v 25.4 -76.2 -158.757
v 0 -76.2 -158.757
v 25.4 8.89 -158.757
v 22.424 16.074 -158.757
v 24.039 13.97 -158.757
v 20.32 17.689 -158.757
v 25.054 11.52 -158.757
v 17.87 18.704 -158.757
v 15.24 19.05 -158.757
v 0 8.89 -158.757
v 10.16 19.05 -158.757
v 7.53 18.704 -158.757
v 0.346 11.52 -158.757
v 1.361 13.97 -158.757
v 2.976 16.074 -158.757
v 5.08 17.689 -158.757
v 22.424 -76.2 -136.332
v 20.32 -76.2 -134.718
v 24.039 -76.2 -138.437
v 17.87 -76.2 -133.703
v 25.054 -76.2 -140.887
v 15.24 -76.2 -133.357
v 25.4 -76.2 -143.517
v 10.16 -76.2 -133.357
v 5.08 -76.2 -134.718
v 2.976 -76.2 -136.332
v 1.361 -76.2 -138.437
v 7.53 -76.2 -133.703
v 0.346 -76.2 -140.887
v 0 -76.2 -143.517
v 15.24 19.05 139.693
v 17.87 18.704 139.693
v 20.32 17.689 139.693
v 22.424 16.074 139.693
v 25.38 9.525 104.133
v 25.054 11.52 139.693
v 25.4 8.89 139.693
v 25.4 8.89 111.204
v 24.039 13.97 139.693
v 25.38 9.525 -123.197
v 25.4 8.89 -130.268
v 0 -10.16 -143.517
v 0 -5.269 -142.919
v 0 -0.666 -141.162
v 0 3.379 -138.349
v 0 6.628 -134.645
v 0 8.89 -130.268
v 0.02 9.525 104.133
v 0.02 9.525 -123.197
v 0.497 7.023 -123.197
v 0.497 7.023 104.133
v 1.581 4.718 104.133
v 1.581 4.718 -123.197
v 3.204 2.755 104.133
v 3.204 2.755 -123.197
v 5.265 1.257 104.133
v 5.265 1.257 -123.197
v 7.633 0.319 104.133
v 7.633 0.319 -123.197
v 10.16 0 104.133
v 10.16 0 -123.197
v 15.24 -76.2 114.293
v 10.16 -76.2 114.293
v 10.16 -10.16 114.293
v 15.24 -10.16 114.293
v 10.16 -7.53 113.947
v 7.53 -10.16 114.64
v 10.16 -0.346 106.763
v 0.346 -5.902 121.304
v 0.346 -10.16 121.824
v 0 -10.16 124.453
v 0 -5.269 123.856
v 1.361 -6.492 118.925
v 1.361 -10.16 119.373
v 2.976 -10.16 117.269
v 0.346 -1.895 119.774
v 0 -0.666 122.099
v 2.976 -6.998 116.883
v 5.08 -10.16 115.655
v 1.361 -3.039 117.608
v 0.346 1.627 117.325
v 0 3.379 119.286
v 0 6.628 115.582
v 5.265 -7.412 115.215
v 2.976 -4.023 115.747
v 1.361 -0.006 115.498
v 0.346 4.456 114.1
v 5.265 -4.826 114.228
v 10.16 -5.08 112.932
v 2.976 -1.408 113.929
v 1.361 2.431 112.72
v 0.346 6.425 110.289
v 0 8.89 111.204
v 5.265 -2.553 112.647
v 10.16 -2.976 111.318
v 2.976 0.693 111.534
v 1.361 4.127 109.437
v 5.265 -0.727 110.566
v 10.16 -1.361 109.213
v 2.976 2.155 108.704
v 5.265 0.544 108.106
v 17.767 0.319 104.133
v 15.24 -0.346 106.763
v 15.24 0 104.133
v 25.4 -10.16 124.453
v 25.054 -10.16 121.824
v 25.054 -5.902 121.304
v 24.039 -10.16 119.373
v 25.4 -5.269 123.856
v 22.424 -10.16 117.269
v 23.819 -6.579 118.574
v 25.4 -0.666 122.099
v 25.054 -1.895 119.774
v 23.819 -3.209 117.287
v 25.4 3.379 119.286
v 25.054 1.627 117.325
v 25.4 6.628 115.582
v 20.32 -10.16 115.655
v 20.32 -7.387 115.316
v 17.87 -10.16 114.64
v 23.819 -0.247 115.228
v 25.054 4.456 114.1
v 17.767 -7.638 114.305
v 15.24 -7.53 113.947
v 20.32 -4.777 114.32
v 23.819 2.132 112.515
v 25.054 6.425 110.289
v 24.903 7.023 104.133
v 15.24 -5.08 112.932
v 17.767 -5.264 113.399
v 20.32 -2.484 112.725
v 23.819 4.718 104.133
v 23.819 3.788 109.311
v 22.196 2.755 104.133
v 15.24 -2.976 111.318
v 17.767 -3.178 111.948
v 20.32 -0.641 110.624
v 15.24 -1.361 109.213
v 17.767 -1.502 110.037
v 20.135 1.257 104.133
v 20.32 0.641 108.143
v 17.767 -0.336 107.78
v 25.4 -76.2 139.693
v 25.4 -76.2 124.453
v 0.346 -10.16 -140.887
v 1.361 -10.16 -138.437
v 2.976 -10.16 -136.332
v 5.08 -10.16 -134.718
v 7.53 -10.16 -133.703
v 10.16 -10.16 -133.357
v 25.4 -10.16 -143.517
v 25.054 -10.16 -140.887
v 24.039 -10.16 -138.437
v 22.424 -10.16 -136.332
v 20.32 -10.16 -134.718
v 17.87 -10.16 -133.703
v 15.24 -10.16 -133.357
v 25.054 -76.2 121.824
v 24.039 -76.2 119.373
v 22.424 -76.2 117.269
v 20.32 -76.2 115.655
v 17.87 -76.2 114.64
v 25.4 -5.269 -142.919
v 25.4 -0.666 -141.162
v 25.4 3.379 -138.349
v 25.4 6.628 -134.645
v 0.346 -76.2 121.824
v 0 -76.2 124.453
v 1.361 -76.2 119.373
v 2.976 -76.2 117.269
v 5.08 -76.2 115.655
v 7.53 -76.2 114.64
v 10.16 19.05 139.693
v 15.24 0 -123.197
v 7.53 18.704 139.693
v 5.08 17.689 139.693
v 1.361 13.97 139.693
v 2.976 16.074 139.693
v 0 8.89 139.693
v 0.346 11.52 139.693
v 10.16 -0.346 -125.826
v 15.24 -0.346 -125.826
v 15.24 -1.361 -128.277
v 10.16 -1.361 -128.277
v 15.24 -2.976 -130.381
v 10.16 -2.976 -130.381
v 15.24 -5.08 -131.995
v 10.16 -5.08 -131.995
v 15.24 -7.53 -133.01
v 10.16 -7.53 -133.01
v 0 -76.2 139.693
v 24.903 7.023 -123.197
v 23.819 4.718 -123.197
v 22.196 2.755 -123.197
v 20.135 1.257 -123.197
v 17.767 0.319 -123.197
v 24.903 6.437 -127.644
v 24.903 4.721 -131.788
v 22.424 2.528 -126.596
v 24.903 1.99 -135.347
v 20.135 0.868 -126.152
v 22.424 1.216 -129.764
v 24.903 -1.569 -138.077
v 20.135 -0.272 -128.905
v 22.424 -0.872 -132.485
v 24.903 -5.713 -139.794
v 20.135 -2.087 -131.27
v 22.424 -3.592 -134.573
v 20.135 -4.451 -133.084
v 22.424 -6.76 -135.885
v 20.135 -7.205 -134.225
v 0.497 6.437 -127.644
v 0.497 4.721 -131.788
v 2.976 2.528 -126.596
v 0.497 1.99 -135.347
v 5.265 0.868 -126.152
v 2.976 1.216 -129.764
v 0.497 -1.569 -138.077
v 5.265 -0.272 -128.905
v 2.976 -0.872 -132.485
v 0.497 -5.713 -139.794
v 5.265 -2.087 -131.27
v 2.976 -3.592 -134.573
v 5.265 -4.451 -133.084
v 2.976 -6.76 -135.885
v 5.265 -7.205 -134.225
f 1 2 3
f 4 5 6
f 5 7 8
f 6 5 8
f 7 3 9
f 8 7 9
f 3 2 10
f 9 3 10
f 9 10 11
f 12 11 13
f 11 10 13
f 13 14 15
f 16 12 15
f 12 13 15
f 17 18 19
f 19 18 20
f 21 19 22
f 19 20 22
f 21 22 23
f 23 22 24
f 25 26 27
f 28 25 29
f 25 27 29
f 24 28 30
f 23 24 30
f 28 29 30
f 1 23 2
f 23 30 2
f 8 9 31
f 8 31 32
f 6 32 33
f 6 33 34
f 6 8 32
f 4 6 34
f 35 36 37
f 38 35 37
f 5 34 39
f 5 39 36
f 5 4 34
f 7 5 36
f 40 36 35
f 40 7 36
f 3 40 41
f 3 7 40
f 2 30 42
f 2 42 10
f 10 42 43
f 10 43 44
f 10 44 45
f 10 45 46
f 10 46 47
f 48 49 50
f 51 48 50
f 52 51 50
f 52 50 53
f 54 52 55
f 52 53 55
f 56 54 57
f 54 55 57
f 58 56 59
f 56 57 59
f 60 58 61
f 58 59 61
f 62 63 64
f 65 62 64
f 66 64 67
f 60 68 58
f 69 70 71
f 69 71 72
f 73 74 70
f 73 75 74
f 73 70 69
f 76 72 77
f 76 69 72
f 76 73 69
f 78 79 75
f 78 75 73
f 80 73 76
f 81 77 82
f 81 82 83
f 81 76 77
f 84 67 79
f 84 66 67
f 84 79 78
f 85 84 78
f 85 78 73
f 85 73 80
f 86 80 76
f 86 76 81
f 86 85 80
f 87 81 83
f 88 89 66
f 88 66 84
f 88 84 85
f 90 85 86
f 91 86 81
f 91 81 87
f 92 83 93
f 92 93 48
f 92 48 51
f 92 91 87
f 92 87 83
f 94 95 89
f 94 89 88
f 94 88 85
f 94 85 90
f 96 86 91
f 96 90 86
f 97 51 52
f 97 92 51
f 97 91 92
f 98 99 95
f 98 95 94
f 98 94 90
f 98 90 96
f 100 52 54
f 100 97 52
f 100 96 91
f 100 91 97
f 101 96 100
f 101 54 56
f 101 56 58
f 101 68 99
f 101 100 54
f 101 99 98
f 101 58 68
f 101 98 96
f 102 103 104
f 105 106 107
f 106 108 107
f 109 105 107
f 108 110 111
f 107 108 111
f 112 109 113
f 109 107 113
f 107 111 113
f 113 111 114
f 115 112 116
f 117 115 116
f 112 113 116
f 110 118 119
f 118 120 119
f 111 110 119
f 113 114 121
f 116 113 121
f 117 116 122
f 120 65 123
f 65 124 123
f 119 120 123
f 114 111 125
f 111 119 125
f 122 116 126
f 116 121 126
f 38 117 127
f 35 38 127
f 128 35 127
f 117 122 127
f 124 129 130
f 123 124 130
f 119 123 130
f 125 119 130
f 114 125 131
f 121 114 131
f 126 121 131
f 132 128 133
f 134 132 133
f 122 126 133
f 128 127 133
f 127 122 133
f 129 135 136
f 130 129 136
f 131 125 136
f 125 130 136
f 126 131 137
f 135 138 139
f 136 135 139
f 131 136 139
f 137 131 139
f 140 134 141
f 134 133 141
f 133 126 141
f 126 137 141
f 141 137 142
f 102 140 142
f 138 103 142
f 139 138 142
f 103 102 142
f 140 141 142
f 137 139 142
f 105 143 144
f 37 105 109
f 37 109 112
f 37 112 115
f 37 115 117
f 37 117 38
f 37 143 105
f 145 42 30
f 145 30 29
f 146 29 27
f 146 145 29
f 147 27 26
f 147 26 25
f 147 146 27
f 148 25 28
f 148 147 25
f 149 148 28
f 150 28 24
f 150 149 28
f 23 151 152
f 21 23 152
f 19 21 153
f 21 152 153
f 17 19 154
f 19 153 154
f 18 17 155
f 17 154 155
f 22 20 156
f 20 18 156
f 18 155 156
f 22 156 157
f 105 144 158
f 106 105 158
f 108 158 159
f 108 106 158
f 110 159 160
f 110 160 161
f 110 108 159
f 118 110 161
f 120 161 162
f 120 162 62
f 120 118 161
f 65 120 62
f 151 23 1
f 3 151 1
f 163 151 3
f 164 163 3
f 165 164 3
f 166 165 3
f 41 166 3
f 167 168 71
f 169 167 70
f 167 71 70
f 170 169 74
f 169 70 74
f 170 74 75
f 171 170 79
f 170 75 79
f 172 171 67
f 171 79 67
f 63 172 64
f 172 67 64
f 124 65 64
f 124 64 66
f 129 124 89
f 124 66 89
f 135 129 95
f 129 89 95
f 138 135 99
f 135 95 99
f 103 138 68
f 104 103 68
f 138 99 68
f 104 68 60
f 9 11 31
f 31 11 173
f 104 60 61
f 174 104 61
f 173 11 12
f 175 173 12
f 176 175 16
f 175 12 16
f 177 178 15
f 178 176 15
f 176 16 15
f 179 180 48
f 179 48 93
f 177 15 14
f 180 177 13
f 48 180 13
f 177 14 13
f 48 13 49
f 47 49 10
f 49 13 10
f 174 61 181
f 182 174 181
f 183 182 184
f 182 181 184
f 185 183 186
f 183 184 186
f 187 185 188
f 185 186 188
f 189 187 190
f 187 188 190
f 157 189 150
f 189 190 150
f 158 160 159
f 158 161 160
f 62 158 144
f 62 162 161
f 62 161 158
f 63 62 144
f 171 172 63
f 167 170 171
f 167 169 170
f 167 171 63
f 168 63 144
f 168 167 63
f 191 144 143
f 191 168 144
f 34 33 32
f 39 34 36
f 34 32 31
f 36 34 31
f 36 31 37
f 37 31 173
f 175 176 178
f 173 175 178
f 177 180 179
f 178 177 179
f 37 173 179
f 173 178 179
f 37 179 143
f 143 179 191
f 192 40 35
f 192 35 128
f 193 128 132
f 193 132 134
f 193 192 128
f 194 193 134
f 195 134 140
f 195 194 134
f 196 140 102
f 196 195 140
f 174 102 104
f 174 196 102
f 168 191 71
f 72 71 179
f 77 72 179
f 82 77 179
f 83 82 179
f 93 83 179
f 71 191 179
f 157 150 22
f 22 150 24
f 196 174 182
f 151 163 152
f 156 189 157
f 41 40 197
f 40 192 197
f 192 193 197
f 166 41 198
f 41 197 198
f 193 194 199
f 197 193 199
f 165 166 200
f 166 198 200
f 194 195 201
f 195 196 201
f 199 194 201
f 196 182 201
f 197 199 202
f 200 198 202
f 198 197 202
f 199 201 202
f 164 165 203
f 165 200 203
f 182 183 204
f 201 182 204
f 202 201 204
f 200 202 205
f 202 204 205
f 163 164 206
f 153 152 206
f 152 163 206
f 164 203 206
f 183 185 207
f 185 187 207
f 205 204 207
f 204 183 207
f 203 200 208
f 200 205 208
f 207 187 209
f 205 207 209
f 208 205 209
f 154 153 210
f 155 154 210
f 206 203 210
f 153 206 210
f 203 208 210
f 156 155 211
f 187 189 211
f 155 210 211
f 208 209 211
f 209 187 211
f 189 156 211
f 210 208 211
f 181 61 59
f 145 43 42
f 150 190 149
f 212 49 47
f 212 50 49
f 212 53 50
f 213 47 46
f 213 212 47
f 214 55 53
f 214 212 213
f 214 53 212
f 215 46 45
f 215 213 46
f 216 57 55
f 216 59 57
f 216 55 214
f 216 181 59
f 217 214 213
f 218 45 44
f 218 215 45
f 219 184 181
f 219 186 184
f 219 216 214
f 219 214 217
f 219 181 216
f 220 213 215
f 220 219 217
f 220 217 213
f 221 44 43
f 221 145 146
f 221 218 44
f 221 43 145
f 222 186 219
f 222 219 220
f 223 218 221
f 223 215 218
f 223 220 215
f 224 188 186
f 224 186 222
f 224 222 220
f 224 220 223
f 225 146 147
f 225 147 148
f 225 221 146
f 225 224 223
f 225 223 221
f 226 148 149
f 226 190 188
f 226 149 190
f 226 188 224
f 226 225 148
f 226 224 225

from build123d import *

# Parameters (mm, degrees)
F0_W         = 76.2
F0_H         = 25.4
F1_DEPTH     = 25.4
F2_T1_DEPTH  = 25.4
F2_T3_DEPTH  = 349.25
F2_T5_DEPTH  = 91.44
F2_T7_DEPTH  = 227.33
F2_T10_ANGLE = 90
F2_T12_ANGLE = 90
F2_T14_ANGLE = 90
F2_T16_ANGLE = 90


# Not quite as in the source:
# - a fillet or chamfer that OpenCascade refuses, or shapes differently, is made with other operations: its cross-section is extruded or revolved along the edge and cut away or added


with BuildPart() as f1:
    # F0 (on Right) → F1 (new body)
    with BuildSketch(Plane.YZ):
        Polygon((19.05, 139.6934016338), (0, 139.6934016338), (0, 114.2934016338), (0, 0), (0, -133.3565983662), (-76.2, -133.3565983662), (-76.2, -158.7565983662), (19.05, -158.7565983662), align=None)
        with Locations((-38.1, 126.9934016338)):
            Rectangle(F0_W, F0_H)
    extrude(amount=F1_DEPTH)

    # F2: fillet of radius 10.16 on 10 edges, made by hand

    # F2_s2 → F2_t1 (join)
    with BuildSketch(Plane.YZ):
        with BuildLine():
            ThreePointArc((-10.16, 114.2934016338), (-2.9757951031, 111.3176065306), (0, 104.1334016338))
            Line((0, 104.1334016338), (0, 114.2934016338))
            Line((0, 114.2934016338), (-10.16, 114.2934016338))
        make_face()
        with BuildLine():
            ThreePointArc((0, -123.1965983662), (-2.9757951031, -130.3808032631), (-10.16, -133.3565983662))
            Line((-10.16, -133.3565983662), (0, -133.3565983662))
            Line((0, -133.3565983662), (0, -123.1965983662))
        make_face()
    extrude(amount=F2_T1_DEPTH)

    # F2_s4 → F2_t3 (cut)
    with BuildSketch(Plane.XY.offset(-184.1565983662)):
        with BuildLine():
            ThreePointArc((10.16, 19.05), (2.9757951031, 16.0742048969), (0, 8.89))
            Line((0, 8.89), (0, 19.05))
            Line((0, 19.05), (10.16, 19.05))
        make_face()
        with BuildLine():
            ThreePointArc((15.24, 19.05), (22.4242048969, 16.0742048969), (25.4, 8.89))
            Line((25.4, 8.89), (25.4, 19.05))
            Line((25.4, 19.05), (15.24, 19.05))
        make_face()
    extrude(amount=F2_T3_DEPTH, mode=Mode.SUBTRACT)

    # F2_s6 → F2_t5 (cut)
    with BuildSketch(Plane.XZ.offset(10.16)):
        with BuildLine():
            ThreePointArc((25.4, 124.4534016338), (22.4242048969, 117.2691967369), (15.24, 114.2934016338))
            Line((15.24, 114.2934016338), (25.4, 114.2934016338))
            Line((25.4, 114.2934016338), (25.4, 124.4534016338))
        make_face()
        with BuildLine():
            ThreePointArc((25.4, -143.5165983662), (22.4242048969, -136.3323934694), (15.24, -133.3565983662))
            Line((15.24, -133.3565983662), (25.4, -133.3565983662))
            Line((25.4, -133.3565983662), (25.4, -143.5165983662))
        make_face()
        with BuildLine():
            ThreePointArc((0, -143.5165983662), (2.9757951031, -136.3323934694), (10.16, -133.3565983662))
            Line((10.16, -133.3565983662), (0, -133.3565983662))
            Line((0, -133.3565983662), (0, -143.5165983662))
        make_face()
        with BuildLine():
            ThreePointArc((0, 124.4534016338), (2.9757951031, 117.2691967369), (10.16, 114.2934016338))
            Line((10.16, 114.2934016338), (0, 114.2934016338))
            Line((0, 114.2934016338), (0, 124.4534016338))
        make_face()
    extrude(amount=F2_T5_DEPTH, mode=Mode.SUBTRACT)

    # F2_s8 → F2_t7 (cut)
    with BuildSketch(Plane.XY.offset(-123.1965983662)):
        with BuildLine():
            ThreePointArc((25.4, 10.16), (22.4242048969, 2.9757951031), (15.24, 0))
            Line((15.24, 0), (25.4, 0))
            Line((25.4, 0), (25.4, 10.16))
        make_face()
        with BuildLine():
            ThreePointArc((0, 10.16), (2.9757951031, 2.9757951031), (10.16, 0))
            Line((10.16, 0), (0, 0))
            Line((0, 0), (0, 10.16))
        make_face()
    extrude(amount=F2_T7_DEPTH, mode=Mode.SUBTRACT)

    # F2_s9 → F2_t10 (revolve, cut)
    with BuildSketch(Plane.XZ.offset(10.16)):
        with BuildLine():
            ThreePointArc((0, 124.4534016338), (2.9757951031, 117.2691967369), (10.16, 114.2934016338))
            Line((10.16, 114.2934016338), (0, 114.2934016338))
            Line((0, 114.2934016338), (0, 124.4534016338))
        make_face()
    revolve(axis=Axis((0, -10.16, 104.1334016338), (-1, 0, 0)), revolution_arc=F2_T10_ANGLE, mode=Mode.SUBTRACT)

    # F2_s11 → F2_t12 (revolve, cut)
    with BuildSketch(Plane.XY.offset(-123.1965983662)):
        with BuildLine():
            ThreePointArc((0, 10.16), (2.9757951031, 2.9757951031), (10.16, 0))
            Line((10.16, 0), (0, 0))
            Line((0, 0), (0, 10.16))
        make_face()
    revolve(axis=Axis((0, -10.16, -123.1965983662), (-1, 0, 0)), revolution_arc=F2_T12_ANGLE, mode=Mode.SUBTRACT)

    # F2_s13 → F2_t14 (revolve, cut)
    with BuildSketch(Plane.XY.offset(-123.1965983662)):
        with BuildLine():
            ThreePointArc((25.4, 10.16), (22.4242048969, 2.9757951031), (15.24, 0))
            Line((15.24, 0), (25.4, 0))
            Line((25.4, 0), (25.4, 10.16))
        make_face()
    revolve(axis=Axis((25.4, -10.16, -123.1965983662), (-1, 0, 0)), revolution_arc=F2_T14_ANGLE, mode=Mode.SUBTRACT)

    # F2_s15 → F2_t16 (revolve, cut)
    with BuildSketch(Plane.XZ.offset(10.16)):
        with BuildLine():
            ThreePointArc((25.4, 124.4534016338), (22.4242048969, 117.2691967369), (15.24, 114.2934016338))
            Line((15.24, 114.2934016338), (25.4, 114.2934016338))
            Line((25.4, 114.2934016338), (25.4, 124.4534016338))
        make_face()
    revolve(axis=Axis((25.4, -10.16, 104.1334016338), (-1, 0, 0)), revolution_arc=F2_T16_ANGLE, mode=Mode.SUBTRACT)


solid = f1.part
